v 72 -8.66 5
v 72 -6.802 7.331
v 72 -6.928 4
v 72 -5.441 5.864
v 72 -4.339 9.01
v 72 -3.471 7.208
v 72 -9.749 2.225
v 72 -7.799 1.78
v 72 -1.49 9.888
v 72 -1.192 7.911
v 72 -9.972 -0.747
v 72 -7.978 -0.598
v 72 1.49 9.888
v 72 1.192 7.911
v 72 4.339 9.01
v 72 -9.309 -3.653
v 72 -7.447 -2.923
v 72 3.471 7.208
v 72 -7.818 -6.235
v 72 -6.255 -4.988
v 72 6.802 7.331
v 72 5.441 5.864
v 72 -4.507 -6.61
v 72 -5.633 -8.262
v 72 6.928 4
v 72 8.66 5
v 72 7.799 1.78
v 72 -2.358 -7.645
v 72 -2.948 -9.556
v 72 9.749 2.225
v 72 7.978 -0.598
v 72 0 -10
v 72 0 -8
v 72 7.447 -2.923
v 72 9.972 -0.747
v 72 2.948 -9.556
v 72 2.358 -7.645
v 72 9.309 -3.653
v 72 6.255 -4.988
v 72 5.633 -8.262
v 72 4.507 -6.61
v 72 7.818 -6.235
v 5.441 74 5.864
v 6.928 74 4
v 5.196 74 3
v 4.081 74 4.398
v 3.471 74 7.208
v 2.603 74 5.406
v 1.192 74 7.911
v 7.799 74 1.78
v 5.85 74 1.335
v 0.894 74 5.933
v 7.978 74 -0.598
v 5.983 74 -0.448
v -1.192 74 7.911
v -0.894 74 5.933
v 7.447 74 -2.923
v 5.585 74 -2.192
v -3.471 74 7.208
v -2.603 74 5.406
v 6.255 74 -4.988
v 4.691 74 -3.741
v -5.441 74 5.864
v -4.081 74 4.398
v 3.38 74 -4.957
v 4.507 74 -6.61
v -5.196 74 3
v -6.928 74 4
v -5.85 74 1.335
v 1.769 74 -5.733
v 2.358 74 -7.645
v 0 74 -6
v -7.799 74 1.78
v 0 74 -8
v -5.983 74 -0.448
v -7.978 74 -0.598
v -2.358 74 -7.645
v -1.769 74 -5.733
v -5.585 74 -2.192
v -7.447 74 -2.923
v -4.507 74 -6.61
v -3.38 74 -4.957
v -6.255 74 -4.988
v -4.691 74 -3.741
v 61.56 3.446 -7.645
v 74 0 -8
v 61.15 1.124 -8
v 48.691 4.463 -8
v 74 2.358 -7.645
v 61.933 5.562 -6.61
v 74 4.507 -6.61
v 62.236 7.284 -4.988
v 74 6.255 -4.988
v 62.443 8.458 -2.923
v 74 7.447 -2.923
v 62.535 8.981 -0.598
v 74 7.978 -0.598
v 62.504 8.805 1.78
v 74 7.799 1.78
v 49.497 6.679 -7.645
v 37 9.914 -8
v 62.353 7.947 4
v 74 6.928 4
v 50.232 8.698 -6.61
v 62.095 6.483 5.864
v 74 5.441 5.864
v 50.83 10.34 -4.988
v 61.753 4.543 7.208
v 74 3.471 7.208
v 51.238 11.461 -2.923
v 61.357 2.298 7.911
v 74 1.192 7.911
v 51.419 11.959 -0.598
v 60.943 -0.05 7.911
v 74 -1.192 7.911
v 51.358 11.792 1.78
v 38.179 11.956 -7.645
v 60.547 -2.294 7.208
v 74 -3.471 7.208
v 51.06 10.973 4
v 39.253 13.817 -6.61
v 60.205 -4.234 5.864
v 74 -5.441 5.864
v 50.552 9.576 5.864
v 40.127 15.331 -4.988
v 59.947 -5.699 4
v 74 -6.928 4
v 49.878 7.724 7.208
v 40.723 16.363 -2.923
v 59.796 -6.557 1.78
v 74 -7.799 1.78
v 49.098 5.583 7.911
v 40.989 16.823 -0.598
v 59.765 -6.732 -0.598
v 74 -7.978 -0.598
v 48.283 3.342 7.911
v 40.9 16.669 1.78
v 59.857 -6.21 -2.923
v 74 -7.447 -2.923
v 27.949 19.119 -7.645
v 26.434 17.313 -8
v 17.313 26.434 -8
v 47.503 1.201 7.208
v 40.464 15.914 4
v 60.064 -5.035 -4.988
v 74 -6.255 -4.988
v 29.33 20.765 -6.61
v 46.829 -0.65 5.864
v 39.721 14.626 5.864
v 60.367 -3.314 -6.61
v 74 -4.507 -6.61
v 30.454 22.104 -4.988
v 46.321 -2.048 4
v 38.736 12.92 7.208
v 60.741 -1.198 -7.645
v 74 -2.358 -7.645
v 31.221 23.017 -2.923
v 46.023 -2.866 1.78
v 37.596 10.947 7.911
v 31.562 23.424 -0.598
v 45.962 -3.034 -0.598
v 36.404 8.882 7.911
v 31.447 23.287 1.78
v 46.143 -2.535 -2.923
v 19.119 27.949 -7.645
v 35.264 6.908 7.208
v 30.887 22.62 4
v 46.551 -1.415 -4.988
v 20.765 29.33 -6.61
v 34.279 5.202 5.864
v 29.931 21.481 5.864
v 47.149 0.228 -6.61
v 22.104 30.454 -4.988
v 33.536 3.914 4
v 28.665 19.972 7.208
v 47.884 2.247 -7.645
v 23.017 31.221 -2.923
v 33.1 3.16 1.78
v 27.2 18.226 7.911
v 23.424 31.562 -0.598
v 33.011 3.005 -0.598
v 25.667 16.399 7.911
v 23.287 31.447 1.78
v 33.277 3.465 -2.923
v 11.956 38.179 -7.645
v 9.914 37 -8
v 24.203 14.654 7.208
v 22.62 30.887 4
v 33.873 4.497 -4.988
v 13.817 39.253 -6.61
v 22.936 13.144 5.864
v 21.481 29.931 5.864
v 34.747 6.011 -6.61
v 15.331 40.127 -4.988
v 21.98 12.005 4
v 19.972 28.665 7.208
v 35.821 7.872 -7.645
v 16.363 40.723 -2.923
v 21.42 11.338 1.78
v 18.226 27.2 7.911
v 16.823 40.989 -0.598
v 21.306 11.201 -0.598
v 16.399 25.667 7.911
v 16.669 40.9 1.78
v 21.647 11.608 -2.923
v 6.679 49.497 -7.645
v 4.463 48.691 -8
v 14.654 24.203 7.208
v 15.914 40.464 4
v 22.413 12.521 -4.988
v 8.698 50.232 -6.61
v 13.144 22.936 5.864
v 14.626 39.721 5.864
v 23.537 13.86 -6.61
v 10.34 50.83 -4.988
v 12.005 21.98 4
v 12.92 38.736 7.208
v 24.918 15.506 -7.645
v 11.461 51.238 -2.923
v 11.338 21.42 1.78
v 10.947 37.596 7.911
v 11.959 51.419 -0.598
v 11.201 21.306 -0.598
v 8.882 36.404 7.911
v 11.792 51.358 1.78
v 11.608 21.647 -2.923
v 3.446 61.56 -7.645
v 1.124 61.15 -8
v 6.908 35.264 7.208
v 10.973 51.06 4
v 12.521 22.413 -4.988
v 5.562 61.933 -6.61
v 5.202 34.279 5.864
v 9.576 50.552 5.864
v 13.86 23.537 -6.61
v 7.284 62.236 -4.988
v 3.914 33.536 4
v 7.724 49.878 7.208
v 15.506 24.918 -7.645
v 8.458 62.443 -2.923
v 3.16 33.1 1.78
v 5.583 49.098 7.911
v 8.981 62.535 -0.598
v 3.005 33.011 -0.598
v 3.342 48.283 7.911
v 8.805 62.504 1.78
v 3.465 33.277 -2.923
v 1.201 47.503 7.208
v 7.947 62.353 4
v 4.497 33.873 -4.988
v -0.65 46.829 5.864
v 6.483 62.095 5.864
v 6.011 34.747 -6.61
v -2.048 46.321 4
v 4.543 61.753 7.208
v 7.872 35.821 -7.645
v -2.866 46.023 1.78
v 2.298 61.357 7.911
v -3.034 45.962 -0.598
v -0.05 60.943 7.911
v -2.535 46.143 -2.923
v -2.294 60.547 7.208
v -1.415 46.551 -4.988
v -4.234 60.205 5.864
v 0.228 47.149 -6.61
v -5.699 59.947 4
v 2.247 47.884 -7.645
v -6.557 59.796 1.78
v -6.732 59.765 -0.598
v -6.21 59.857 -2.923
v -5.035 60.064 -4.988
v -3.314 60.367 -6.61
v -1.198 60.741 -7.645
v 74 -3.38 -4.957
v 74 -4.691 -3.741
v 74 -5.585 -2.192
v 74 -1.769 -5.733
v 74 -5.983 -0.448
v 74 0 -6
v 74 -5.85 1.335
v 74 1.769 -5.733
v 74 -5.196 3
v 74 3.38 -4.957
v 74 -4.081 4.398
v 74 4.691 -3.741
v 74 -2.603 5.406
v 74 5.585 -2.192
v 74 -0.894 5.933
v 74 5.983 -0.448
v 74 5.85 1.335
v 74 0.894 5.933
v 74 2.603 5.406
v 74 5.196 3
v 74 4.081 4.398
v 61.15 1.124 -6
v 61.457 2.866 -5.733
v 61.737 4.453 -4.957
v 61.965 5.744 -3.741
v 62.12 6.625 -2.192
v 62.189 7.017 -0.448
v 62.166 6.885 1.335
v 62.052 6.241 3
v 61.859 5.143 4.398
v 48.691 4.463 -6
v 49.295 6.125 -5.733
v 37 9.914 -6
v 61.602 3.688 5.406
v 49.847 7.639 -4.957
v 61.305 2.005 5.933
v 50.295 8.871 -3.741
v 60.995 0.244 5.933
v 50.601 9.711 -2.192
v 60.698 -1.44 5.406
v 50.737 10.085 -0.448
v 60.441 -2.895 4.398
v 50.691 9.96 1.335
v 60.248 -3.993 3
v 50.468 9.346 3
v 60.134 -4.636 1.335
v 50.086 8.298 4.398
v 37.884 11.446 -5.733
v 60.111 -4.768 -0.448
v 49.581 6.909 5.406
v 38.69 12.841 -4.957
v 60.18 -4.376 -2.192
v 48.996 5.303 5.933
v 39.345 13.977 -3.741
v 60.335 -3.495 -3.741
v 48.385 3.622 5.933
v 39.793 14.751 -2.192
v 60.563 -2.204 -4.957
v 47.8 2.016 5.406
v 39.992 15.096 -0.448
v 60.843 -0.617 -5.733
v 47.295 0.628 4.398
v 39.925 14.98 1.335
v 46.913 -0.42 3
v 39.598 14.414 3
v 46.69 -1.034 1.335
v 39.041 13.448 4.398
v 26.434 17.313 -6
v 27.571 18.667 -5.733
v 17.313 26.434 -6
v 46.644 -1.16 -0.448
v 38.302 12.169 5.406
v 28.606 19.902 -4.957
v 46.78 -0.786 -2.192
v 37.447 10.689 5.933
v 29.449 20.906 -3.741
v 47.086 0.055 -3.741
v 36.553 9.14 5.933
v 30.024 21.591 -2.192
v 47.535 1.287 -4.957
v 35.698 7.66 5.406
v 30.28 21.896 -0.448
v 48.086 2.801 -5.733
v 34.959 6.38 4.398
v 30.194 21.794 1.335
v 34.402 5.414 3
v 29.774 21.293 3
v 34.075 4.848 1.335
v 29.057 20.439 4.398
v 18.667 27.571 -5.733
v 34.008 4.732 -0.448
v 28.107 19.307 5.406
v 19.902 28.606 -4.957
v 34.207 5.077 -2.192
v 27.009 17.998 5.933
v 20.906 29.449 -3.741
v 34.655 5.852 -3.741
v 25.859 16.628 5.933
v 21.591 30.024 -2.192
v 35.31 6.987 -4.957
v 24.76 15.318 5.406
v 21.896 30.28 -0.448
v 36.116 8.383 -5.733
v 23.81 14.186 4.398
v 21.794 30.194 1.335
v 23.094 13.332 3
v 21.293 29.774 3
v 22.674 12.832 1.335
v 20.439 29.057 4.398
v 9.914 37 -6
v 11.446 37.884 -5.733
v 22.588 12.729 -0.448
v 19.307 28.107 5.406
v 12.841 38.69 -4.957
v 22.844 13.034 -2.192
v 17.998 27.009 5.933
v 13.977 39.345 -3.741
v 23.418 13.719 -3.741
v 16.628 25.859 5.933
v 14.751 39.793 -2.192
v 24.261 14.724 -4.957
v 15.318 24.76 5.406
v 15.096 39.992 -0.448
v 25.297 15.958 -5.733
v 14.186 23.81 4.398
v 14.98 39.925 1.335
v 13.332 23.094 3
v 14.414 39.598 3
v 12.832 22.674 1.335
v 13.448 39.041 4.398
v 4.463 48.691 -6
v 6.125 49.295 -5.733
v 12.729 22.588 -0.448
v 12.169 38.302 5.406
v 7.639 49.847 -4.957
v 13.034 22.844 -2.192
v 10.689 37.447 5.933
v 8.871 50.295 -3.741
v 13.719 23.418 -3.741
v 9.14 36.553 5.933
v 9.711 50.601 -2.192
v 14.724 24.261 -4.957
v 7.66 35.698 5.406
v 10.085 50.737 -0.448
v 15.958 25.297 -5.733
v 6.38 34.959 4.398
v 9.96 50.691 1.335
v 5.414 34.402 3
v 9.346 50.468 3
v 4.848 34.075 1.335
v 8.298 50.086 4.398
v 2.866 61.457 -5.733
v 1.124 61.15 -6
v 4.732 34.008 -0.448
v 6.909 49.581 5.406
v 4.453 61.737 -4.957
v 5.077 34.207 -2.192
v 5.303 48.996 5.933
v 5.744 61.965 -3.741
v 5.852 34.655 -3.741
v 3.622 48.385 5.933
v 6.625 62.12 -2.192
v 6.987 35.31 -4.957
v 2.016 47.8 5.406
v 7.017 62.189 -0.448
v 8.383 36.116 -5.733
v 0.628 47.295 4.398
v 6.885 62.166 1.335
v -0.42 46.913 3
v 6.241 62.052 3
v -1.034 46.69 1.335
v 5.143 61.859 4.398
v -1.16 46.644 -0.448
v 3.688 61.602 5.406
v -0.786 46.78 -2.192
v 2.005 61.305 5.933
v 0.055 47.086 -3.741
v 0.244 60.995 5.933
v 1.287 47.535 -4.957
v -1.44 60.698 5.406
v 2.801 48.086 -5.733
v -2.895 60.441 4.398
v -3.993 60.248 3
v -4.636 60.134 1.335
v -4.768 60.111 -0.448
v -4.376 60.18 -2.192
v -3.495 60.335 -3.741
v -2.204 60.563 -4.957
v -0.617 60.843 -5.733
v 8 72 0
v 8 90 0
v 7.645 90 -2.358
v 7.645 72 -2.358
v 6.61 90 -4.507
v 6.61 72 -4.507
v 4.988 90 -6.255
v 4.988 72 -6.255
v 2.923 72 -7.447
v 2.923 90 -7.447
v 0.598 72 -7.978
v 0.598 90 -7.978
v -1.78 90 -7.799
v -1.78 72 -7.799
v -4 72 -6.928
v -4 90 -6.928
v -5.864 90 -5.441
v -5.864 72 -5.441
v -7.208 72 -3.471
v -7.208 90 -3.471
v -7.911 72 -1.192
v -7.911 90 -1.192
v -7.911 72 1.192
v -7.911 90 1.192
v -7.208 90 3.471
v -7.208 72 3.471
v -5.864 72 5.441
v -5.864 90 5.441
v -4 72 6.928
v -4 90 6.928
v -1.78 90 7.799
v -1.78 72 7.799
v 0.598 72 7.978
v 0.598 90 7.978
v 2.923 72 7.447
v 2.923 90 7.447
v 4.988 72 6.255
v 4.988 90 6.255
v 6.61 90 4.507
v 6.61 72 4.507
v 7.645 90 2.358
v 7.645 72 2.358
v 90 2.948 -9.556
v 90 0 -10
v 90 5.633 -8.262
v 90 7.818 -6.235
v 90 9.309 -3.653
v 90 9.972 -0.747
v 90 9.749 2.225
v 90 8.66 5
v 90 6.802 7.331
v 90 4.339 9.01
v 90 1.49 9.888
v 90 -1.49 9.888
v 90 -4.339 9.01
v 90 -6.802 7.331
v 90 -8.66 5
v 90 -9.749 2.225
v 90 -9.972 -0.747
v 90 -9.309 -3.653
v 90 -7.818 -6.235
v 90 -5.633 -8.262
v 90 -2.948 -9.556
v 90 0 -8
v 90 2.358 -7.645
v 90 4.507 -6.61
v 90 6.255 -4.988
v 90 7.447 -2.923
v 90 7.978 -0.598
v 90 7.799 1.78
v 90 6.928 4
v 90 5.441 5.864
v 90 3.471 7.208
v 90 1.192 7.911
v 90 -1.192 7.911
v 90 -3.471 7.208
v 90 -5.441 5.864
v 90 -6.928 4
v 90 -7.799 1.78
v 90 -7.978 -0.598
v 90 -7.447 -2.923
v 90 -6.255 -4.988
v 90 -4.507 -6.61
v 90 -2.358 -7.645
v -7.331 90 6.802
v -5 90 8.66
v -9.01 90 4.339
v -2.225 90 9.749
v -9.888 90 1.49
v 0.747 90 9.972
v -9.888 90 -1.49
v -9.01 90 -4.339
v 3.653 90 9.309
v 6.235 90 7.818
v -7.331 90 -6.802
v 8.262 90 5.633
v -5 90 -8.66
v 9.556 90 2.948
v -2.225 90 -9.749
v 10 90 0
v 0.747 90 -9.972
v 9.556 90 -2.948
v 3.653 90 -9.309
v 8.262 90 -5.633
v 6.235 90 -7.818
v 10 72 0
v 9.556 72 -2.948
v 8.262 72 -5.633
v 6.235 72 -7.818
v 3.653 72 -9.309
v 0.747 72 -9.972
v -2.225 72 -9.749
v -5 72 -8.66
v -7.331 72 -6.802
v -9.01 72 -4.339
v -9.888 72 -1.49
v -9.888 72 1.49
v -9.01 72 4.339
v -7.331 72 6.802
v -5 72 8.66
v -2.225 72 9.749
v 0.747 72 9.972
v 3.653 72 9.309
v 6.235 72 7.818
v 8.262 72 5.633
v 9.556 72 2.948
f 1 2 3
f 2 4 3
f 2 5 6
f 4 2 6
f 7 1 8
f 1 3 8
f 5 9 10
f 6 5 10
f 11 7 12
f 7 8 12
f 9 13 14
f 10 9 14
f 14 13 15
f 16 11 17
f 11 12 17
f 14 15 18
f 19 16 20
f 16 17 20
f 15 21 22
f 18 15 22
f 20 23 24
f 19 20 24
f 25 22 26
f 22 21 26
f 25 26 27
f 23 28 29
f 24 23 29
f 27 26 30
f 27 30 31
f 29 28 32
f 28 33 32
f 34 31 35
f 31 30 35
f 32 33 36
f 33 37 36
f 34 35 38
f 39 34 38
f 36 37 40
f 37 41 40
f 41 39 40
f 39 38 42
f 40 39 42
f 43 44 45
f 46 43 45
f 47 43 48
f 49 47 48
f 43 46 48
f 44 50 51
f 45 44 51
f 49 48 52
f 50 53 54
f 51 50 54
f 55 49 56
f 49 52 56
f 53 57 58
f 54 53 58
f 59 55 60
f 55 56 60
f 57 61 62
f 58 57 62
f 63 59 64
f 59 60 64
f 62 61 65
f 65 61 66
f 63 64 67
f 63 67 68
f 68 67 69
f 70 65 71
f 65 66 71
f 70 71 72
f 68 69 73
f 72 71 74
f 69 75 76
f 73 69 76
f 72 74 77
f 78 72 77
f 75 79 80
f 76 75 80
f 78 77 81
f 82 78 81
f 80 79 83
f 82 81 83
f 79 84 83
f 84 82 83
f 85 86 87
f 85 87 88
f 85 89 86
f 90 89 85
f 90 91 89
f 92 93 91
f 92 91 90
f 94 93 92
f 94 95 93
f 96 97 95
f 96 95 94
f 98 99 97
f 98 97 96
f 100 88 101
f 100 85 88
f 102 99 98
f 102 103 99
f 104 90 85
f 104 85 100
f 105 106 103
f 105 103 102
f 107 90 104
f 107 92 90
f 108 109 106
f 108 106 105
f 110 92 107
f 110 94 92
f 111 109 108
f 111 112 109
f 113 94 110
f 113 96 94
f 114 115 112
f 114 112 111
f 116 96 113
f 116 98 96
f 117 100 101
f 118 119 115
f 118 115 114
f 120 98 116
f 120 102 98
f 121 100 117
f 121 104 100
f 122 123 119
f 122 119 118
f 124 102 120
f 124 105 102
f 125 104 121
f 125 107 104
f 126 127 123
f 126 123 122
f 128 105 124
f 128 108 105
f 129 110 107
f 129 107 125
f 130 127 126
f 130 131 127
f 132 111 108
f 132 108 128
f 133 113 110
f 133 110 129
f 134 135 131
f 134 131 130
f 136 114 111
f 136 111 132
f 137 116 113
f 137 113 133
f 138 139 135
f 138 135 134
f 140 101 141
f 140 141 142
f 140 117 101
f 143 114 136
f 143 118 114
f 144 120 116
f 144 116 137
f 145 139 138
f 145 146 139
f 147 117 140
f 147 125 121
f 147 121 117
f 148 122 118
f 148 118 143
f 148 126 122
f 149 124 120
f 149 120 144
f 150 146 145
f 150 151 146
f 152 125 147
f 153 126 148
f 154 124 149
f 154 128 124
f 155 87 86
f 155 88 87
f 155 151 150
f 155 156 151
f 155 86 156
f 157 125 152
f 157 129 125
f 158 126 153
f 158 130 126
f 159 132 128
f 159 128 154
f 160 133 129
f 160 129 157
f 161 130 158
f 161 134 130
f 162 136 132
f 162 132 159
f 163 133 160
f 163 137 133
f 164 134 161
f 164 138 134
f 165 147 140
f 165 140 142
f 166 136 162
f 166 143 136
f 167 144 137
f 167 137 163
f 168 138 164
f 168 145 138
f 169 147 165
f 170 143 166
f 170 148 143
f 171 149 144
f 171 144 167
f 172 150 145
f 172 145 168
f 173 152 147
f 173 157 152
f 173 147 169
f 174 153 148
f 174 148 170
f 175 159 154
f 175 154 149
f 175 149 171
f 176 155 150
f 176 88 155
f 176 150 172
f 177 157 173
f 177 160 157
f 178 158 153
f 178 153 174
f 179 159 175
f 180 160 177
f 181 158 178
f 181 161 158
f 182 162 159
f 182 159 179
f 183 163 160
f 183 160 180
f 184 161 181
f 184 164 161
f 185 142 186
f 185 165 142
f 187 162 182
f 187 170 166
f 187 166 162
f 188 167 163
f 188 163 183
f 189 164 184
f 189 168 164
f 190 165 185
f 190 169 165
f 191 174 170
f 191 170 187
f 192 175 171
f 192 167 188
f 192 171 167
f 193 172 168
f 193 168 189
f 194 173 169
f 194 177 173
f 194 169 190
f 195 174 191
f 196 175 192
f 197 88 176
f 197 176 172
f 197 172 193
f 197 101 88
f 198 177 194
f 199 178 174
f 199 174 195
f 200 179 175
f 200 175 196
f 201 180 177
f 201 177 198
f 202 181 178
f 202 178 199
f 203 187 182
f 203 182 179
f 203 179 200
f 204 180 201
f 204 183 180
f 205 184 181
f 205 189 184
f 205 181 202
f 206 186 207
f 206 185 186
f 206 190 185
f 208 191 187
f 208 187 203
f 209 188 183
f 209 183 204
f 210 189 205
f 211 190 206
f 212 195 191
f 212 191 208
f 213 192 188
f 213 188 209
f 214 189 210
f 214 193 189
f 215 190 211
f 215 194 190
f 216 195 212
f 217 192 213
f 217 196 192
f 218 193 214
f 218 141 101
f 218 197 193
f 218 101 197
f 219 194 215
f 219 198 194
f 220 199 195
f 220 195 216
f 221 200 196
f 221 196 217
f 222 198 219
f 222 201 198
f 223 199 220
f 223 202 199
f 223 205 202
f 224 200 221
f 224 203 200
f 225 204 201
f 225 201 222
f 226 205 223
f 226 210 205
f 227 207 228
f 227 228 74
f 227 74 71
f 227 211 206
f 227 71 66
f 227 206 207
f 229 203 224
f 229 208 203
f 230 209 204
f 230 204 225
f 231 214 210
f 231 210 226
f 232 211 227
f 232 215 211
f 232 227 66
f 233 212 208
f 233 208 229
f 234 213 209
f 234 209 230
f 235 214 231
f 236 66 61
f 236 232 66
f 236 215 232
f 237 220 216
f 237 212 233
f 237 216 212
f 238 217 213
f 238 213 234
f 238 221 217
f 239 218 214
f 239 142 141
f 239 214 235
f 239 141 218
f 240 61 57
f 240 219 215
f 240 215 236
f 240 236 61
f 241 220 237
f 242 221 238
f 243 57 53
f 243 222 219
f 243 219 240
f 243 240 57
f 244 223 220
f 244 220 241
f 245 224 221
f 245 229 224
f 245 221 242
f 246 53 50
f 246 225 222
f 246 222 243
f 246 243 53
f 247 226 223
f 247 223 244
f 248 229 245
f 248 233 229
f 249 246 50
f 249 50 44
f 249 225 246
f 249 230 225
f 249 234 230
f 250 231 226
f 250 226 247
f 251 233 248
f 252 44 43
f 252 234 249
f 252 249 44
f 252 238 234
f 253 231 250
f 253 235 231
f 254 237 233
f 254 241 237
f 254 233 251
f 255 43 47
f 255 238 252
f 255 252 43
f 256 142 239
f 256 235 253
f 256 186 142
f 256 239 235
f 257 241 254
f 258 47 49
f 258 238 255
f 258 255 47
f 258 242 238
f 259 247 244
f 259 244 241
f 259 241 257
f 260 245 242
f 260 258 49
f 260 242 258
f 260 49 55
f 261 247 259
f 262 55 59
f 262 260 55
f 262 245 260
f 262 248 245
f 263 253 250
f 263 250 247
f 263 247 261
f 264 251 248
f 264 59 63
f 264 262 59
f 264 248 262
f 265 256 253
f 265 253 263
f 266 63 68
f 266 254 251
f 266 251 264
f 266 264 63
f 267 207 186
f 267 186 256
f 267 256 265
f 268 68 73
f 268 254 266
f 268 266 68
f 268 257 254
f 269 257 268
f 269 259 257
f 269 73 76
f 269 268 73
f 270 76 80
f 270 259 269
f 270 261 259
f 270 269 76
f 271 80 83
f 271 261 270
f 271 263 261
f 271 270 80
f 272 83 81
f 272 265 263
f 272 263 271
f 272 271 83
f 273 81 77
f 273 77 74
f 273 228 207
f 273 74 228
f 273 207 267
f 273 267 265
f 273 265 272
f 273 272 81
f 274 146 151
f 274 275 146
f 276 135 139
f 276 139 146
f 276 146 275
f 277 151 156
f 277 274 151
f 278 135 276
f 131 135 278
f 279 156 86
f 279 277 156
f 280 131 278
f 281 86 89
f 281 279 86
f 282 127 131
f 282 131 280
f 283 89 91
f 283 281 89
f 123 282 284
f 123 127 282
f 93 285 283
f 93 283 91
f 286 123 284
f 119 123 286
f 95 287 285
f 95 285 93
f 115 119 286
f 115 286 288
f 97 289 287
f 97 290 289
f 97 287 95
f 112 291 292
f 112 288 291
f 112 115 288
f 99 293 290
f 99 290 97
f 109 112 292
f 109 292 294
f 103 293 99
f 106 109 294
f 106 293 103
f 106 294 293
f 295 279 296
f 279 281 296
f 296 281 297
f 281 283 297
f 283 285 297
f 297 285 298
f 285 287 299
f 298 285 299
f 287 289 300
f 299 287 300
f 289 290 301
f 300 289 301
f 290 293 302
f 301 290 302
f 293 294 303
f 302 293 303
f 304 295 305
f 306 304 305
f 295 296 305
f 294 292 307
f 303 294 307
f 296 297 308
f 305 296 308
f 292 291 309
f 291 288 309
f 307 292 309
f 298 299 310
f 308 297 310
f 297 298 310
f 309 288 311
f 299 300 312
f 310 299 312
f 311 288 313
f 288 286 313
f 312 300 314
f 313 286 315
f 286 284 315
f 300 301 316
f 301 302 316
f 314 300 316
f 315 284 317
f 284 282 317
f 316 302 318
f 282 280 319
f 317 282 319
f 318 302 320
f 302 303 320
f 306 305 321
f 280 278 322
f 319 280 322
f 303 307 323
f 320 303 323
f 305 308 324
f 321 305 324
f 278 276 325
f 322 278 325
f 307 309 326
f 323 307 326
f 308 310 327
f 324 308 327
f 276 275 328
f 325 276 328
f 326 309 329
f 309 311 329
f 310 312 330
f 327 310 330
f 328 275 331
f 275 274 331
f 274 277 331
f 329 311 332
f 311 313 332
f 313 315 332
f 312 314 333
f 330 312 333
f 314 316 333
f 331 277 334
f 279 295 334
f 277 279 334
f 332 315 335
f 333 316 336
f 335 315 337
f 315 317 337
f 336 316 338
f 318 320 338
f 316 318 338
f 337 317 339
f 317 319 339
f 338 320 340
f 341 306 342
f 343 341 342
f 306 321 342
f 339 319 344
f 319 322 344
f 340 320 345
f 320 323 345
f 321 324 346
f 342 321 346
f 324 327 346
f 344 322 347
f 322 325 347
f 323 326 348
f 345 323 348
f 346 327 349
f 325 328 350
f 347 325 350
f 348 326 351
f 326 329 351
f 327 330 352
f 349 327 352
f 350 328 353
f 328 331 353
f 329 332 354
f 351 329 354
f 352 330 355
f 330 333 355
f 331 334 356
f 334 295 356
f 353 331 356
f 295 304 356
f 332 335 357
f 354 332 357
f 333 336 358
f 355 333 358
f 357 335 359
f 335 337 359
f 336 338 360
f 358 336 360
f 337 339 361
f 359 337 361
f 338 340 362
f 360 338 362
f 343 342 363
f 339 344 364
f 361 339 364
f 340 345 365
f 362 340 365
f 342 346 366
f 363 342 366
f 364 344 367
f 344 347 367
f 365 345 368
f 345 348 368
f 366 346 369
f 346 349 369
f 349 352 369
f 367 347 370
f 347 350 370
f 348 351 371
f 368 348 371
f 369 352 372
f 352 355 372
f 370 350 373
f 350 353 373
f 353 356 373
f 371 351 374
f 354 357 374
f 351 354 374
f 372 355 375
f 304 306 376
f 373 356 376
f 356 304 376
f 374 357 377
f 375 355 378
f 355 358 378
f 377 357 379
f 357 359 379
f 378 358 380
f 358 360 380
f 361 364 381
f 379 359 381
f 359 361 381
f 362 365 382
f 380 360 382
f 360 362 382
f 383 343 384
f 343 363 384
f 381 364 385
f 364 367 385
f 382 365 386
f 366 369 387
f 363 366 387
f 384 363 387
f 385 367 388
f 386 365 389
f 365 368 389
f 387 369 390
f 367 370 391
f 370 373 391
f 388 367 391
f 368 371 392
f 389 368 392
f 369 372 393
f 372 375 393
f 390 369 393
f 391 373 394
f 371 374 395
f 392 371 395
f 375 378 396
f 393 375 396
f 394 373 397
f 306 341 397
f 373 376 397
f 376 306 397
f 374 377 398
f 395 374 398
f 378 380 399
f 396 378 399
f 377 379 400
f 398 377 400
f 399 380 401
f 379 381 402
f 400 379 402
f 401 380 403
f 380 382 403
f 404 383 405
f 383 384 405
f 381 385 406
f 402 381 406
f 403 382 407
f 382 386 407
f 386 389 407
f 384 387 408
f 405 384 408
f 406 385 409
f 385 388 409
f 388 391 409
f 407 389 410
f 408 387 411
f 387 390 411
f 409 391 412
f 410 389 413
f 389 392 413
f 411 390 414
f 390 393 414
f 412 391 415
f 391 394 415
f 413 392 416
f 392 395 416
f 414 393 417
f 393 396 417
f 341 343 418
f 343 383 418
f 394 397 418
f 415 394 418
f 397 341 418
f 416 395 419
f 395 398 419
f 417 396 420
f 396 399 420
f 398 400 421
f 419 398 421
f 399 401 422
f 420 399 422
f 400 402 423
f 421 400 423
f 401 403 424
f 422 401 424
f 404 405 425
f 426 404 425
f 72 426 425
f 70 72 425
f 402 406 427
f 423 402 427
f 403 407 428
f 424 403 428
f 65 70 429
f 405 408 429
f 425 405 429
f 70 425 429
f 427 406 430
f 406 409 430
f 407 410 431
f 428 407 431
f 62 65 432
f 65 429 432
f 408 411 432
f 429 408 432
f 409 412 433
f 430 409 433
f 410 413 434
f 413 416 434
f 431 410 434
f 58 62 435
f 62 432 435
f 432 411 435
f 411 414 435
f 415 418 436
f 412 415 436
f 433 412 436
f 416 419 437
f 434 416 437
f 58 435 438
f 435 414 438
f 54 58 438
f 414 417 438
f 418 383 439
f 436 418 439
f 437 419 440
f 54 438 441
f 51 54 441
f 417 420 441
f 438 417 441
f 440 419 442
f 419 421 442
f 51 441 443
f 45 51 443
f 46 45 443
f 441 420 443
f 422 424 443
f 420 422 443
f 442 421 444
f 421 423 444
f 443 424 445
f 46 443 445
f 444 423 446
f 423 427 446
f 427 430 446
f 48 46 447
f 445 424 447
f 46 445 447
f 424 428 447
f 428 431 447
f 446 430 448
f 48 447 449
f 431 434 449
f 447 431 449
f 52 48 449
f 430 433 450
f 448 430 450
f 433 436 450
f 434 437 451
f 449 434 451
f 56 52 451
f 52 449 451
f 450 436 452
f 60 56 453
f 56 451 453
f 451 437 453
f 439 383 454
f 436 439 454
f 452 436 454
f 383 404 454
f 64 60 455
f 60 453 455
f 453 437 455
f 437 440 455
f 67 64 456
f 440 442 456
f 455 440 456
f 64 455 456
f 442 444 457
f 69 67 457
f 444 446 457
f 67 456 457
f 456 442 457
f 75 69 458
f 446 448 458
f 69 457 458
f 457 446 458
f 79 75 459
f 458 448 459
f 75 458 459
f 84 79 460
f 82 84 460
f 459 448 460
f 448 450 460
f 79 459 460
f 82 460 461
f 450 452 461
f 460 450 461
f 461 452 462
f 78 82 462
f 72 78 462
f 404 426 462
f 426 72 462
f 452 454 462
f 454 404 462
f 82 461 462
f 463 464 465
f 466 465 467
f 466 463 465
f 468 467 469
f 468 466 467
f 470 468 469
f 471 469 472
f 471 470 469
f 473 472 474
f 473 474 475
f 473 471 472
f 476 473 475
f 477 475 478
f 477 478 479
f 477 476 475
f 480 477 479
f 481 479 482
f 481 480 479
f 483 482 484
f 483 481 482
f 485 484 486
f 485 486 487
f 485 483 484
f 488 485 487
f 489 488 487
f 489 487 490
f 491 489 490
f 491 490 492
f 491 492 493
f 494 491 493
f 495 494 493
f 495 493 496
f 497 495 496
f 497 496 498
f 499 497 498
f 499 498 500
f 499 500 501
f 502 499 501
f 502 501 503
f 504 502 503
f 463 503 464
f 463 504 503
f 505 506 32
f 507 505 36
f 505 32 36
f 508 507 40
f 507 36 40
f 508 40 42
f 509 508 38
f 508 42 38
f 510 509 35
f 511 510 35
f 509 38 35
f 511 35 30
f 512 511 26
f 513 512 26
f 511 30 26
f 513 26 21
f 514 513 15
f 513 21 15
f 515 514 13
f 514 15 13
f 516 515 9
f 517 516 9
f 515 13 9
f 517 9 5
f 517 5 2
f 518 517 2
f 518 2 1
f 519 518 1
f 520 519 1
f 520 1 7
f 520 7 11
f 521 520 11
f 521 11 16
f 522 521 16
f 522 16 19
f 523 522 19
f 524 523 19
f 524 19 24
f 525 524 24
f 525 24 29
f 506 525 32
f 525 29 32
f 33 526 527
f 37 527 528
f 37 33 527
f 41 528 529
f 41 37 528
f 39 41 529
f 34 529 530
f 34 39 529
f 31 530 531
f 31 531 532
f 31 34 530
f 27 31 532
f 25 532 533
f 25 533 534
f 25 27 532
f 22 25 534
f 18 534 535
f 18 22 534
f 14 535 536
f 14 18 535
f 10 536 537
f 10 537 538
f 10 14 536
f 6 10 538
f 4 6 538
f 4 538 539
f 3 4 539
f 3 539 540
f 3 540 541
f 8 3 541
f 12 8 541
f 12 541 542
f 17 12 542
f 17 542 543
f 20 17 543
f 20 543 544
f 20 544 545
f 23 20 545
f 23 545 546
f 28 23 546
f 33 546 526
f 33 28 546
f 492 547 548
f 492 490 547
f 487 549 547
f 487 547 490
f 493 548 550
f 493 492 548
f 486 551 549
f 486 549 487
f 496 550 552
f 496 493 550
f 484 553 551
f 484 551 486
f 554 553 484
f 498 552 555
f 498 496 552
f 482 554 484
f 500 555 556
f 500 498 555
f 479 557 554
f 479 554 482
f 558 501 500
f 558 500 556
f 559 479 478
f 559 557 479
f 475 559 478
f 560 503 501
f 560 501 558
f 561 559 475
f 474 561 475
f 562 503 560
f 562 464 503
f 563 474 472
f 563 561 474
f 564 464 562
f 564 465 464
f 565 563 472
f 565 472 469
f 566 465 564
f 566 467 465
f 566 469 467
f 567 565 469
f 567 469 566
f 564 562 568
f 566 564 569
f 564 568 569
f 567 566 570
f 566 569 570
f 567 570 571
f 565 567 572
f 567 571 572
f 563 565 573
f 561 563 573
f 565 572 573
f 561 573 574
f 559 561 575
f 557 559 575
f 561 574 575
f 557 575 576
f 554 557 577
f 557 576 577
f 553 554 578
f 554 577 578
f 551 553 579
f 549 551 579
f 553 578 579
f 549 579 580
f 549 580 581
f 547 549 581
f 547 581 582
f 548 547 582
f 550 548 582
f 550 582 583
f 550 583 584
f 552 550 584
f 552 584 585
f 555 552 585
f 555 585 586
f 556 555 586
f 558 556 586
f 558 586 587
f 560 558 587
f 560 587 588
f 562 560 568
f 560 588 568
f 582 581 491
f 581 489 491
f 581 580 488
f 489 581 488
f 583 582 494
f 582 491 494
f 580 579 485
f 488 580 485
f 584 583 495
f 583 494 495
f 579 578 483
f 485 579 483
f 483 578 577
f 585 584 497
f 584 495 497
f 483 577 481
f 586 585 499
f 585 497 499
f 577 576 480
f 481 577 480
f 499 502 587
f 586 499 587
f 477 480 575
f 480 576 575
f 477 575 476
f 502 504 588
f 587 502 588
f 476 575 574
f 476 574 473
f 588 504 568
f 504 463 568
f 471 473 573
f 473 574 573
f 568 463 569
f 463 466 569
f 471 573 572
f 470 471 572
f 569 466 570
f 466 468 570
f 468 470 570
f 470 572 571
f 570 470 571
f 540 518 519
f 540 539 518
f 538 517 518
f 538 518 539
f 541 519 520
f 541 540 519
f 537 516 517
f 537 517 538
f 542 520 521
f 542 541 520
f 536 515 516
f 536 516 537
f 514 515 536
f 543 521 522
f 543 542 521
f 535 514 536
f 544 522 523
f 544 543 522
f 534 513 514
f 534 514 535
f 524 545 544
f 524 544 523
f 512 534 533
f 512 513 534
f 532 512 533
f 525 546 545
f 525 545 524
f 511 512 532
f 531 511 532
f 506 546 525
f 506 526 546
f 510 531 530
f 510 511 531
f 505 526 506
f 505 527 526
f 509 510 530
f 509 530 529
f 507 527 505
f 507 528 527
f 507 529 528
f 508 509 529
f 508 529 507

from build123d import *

# Parameters (mm, degrees)
SKETCH8_R                = 8
SKETCH8_R_2              = 6
EXTRUDE_THIN1_DEPTH      = 16
EXTRUDE_THIN1_DEPTH_BACK = 2
SKETCH11_R               = 10
SKETCH11_R_2             = 8
EXTRUDE_THIN2_DEPTH      = 16
EXTRUDE_THIN2_DEPTH_BACK = 2
SKETCH10_R               = 10
SKETCH10_R_2             = 8


with BuildPart() as part:
    # Sweep-Thin1: sweep along a path in Sketch5
    with BuildLine(Plane.XY) as sweep_thin1_path:
        ThreePointArc((74, 0), (21.674098192, 21.674098192), (0, 74))
    # Sketch8 → Sweep-Thin1 (sweep)
    with BuildSketch(Plane(origin=(74, 0, 0), x_dir=(0, 0, -1), z_dir=(1, 0, 0))):
        Circle(SKETCH8_R)
        Circle(SKETCH8_R_2, mode=Mode.SUBTRACT)
    sweep(path=sweep_thin1_path.line)


with BuildPart() as body_2:
    # Sketch11 → Extrude-Thin1 (new, two sides: drawn at the far end of the back side and taken through both)
    with BuildSketch(Plane(origin=(74, 0, 0), x_dir=(0, 0, -1), z_dir=(1, 0, 0)).offset(-EXTRUDE_THIN1_DEPTH_BACK)):
        Circle(SKETCH11_R)
        Circle(SKETCH11_R_2, mode=Mode.SUBTRACT)
    extrude(amount=EXTRUDE_THIN1_DEPTH + EXTRUDE_THIN1_DEPTH_BACK)


with BuildPart() as body_3:
    # Sketch10 → Extrude-Thin2 (new, two sides: drawn at the far end of the back side and taken through both)
    with BuildSketch(Plane(origin=(0, 74, 0), x_dir=(1, 0, 0), z_dir=(0, 1, 0)).offset(-EXTRUDE_THIN2_DEPTH_BACK)):
        Circle(SKETCH10_R)
        Circle(SKETCH10_R_2, mode=Mode.SUBTRACT)
    extrude(amount=EXTRUDE_THIN2_DEPTH + EXTRUDE_THIN2_DEPTH_BACK)


solid = Compound([part.part, body_2.part, body_3.part])
